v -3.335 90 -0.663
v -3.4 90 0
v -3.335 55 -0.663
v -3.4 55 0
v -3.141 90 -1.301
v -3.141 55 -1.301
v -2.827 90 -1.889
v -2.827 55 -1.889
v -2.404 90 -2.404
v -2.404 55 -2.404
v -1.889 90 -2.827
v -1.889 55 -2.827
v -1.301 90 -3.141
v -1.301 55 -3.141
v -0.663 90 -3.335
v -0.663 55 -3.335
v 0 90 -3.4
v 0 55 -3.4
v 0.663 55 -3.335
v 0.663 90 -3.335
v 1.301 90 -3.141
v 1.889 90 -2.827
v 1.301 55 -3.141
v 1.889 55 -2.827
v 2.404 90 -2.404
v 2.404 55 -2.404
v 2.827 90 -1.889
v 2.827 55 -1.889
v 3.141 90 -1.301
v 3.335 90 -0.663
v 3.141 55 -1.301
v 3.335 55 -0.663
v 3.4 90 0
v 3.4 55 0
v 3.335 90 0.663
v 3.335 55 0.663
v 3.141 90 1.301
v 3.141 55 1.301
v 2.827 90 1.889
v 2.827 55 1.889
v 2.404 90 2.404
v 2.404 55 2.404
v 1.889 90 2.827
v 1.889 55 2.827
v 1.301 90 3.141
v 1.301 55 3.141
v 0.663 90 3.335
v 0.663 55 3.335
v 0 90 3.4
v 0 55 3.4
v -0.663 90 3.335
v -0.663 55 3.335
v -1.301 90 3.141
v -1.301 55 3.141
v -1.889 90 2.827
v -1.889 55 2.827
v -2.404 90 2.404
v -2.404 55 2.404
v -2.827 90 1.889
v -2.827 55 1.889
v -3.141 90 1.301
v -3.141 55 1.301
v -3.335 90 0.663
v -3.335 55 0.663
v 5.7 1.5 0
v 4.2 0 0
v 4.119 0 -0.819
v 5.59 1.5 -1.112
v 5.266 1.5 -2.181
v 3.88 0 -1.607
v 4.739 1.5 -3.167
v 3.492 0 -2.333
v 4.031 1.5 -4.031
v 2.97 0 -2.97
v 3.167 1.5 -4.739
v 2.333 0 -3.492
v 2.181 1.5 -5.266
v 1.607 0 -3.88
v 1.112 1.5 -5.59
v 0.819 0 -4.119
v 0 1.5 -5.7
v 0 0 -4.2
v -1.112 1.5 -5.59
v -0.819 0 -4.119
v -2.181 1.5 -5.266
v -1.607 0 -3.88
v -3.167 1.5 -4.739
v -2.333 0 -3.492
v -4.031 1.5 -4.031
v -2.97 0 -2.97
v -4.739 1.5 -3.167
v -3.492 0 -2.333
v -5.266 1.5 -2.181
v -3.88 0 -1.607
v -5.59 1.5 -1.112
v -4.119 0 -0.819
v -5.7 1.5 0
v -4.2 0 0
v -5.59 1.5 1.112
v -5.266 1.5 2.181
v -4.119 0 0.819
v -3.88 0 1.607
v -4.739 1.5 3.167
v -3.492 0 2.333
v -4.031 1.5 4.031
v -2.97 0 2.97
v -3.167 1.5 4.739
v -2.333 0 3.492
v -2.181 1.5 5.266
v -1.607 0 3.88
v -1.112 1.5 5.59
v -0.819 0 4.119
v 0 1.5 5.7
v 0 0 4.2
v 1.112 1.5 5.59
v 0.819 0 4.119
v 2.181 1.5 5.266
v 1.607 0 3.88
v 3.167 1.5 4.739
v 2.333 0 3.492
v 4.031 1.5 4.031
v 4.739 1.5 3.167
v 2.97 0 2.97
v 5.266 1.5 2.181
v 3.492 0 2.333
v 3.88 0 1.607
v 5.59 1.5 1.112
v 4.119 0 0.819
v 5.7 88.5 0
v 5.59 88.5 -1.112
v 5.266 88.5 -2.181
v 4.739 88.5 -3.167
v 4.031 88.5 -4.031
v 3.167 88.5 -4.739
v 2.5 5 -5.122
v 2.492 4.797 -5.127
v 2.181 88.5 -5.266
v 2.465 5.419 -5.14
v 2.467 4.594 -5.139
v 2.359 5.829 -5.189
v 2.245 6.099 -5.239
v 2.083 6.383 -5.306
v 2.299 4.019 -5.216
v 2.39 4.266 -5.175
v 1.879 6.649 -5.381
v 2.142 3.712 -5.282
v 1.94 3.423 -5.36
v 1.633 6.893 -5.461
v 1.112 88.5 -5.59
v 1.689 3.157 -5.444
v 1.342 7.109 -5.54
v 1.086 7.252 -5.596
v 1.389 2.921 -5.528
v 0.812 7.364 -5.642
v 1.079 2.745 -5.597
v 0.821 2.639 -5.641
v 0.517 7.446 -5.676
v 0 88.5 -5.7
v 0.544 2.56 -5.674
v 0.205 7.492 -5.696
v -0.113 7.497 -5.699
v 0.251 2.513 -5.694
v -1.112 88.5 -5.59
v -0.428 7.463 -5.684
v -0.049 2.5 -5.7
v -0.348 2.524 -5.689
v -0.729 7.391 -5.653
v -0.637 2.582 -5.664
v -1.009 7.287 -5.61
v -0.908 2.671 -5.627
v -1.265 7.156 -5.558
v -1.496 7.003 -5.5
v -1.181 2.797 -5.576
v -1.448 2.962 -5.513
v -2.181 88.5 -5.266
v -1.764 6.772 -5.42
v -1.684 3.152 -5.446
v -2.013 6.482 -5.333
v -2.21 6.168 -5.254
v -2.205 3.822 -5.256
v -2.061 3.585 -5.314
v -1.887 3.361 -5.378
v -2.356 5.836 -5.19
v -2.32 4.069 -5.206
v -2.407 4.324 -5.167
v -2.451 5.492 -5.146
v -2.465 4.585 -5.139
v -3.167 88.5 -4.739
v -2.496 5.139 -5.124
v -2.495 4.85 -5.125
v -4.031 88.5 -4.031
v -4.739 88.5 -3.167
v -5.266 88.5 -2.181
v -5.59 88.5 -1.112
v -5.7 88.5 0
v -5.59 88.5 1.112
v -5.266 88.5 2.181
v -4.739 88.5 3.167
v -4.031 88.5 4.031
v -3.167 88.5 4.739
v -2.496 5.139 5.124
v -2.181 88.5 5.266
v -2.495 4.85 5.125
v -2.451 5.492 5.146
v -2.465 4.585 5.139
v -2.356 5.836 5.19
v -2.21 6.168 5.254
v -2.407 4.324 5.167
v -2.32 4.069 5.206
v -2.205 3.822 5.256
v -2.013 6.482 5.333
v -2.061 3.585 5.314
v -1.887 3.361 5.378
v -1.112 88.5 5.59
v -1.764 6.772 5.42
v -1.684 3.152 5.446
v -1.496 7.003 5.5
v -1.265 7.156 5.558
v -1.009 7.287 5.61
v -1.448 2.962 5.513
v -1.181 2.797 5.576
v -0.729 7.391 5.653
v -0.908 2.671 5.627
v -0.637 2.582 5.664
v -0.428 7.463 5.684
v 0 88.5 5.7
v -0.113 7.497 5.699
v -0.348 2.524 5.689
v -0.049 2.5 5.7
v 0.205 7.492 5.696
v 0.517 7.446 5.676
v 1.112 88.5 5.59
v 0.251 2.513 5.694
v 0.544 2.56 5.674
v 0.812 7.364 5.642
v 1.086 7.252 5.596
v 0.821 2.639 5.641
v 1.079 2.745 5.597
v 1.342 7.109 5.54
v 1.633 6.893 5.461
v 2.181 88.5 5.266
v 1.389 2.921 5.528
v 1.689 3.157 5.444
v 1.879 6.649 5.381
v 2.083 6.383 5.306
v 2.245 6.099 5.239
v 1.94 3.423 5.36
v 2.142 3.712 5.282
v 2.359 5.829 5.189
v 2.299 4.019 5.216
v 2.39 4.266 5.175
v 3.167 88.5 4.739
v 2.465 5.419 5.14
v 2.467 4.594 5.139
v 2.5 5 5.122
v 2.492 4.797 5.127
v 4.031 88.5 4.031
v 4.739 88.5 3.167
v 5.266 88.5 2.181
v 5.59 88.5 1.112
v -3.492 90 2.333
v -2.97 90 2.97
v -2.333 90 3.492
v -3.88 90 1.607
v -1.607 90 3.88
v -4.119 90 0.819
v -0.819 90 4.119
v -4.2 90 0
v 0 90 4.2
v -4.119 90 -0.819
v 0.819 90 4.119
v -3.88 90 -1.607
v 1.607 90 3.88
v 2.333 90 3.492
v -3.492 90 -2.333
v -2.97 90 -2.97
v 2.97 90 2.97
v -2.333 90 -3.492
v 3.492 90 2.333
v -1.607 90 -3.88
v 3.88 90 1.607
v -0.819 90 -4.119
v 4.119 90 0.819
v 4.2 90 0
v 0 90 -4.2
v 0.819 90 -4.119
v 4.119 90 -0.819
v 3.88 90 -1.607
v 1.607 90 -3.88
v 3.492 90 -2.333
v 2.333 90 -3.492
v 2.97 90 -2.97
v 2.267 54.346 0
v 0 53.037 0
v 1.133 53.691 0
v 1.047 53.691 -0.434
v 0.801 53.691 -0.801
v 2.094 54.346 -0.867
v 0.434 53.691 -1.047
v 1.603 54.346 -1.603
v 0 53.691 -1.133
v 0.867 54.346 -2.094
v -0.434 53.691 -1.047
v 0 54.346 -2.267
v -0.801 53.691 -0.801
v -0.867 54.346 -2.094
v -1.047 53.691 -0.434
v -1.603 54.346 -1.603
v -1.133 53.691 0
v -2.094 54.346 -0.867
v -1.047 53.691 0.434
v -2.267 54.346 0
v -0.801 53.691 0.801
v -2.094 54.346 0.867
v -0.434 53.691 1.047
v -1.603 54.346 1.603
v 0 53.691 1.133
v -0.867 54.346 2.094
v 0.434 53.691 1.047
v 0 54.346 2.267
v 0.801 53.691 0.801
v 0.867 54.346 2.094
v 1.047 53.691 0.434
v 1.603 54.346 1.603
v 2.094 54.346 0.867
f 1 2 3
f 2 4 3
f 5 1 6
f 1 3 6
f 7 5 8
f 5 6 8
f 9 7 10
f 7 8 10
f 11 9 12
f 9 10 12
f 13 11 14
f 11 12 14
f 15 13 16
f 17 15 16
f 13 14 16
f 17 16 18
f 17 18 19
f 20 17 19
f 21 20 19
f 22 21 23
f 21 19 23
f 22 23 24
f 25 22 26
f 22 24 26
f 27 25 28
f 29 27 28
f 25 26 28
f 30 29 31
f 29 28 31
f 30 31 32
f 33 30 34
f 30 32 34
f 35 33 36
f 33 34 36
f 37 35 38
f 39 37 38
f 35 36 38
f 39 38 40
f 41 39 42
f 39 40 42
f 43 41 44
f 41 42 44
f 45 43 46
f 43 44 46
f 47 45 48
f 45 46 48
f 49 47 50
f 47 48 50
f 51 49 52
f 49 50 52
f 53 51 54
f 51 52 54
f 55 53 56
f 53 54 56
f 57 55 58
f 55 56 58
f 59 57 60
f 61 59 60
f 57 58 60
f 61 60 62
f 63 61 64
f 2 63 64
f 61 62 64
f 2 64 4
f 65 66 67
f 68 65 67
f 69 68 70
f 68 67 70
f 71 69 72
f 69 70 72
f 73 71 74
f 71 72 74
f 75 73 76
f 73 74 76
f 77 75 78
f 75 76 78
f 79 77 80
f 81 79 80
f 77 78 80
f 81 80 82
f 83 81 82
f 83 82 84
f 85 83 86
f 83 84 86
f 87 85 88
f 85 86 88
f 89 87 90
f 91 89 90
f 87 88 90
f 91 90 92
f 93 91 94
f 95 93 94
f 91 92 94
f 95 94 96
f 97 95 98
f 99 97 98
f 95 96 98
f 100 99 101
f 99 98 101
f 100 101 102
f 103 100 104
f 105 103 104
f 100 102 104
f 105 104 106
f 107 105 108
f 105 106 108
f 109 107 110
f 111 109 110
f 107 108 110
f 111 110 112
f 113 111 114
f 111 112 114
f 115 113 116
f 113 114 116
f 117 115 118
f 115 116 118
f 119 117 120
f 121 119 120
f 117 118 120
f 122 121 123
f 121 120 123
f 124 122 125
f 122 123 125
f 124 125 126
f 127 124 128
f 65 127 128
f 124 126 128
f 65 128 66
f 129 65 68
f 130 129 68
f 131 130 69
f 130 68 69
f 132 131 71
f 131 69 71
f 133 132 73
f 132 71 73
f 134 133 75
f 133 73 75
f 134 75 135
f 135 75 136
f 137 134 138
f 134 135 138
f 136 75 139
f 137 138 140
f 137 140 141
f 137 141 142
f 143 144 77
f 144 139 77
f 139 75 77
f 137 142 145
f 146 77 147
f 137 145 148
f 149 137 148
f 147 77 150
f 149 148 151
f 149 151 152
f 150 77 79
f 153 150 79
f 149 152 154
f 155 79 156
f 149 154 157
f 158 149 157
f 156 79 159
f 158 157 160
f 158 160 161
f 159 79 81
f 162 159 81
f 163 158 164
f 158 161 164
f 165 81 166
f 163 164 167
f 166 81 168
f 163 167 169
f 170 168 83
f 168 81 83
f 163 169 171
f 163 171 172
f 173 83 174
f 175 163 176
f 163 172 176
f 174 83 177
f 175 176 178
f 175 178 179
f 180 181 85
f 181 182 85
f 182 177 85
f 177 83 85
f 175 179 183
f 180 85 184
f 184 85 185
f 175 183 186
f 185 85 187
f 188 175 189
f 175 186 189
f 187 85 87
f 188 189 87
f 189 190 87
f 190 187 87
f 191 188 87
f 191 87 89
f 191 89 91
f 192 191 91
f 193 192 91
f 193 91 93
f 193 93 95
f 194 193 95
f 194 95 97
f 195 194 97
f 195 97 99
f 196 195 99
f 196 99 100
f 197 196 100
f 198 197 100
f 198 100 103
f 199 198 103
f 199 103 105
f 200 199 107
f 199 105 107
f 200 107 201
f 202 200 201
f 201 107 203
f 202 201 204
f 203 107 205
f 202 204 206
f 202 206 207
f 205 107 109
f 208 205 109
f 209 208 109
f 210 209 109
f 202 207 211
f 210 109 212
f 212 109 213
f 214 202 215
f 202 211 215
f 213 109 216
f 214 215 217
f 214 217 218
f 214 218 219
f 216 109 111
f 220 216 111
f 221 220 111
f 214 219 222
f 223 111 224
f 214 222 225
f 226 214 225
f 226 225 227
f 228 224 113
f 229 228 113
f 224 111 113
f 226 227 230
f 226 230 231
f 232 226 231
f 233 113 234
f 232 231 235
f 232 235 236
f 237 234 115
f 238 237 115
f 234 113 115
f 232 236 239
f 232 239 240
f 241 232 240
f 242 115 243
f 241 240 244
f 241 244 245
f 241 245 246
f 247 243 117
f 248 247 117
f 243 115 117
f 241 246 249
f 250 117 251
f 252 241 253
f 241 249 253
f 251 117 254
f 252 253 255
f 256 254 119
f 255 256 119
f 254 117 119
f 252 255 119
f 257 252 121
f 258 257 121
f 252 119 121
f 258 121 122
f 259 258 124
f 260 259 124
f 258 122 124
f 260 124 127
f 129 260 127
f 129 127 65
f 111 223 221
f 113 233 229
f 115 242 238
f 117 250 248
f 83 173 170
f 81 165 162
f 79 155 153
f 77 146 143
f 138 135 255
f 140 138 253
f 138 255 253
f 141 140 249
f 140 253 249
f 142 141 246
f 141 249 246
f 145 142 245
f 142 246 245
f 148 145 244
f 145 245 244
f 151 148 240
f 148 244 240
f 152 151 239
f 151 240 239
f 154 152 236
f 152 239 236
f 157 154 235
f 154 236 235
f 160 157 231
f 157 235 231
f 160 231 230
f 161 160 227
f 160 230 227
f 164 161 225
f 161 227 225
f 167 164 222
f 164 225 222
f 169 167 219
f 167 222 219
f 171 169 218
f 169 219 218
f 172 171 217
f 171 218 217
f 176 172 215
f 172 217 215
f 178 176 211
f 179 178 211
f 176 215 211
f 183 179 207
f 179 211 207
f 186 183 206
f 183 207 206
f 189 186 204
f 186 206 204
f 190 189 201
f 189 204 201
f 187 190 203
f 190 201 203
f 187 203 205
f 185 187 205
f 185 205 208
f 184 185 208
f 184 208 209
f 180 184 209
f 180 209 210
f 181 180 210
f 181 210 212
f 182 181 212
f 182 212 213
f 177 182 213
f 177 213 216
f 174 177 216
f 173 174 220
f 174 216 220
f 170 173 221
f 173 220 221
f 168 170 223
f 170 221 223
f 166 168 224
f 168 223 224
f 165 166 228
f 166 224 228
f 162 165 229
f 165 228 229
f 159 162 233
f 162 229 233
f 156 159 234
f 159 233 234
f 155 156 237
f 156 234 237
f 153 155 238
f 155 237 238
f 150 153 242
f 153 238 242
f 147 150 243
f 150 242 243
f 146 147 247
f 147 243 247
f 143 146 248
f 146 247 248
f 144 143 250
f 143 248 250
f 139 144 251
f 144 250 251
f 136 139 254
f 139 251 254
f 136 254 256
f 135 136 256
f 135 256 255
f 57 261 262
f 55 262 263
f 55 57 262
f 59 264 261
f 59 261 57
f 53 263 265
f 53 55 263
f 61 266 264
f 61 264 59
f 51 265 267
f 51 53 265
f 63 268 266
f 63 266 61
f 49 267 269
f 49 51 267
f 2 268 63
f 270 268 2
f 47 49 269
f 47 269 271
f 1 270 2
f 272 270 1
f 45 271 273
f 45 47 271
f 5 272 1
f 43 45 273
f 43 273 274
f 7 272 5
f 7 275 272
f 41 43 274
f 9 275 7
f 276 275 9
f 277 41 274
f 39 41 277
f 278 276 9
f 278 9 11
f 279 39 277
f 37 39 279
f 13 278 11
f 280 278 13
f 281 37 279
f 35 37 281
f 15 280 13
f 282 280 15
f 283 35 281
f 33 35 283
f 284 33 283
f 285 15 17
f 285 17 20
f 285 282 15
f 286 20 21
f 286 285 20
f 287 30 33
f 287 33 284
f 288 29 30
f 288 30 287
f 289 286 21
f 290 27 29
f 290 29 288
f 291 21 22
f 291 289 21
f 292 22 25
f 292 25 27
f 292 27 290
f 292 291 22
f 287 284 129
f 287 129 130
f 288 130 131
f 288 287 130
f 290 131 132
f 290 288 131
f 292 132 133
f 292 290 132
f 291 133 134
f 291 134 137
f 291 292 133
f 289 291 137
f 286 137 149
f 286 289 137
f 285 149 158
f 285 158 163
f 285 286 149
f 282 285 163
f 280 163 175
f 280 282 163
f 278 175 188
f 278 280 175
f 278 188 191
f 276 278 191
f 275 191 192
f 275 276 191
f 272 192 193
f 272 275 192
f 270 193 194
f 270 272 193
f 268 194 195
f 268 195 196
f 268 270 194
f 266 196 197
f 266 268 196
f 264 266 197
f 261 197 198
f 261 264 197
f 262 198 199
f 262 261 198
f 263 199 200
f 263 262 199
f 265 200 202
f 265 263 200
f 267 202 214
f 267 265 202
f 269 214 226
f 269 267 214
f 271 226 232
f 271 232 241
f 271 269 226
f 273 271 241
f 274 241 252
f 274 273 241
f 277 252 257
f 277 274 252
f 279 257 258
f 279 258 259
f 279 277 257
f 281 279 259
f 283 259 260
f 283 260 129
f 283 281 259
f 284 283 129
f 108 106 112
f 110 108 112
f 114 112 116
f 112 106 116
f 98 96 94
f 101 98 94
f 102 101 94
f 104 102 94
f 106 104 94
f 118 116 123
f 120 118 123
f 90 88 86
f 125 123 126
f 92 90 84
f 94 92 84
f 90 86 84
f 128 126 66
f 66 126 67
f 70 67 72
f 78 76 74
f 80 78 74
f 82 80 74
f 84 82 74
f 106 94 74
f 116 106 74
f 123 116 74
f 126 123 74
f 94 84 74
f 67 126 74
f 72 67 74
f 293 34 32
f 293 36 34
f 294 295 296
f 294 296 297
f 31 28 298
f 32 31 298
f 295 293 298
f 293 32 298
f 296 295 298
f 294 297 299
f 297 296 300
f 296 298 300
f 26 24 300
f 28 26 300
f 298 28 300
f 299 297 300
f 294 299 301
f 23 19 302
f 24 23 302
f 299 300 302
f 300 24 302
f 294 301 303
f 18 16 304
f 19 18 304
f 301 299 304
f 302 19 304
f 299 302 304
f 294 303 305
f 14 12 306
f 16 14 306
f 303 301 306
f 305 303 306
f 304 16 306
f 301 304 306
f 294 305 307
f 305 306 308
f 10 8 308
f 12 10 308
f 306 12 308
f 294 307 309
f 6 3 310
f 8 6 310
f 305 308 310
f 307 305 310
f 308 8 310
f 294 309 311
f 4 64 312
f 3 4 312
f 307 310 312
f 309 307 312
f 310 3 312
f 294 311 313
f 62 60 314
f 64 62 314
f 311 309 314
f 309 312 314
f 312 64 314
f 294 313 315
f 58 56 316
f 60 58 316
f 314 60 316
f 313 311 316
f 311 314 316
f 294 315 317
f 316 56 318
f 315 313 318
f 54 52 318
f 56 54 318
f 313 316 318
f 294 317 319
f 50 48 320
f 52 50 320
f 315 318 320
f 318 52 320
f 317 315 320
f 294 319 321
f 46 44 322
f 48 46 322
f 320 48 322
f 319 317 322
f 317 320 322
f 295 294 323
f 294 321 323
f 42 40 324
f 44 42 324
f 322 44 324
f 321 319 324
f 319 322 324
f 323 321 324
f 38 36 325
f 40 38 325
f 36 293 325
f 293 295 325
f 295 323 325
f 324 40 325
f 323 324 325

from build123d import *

# Parameters (mm, degrees)
SKETCH1_R             = 5.7
BOSS_EXTRUDE1_DEPTH   = 90
M8_TAPPED_HOLE1_D     = 6.8
M8_TAPPED_HOLE1_DEPTH = 35
M8_TAPPED_HOLE1_TIP   = 1.962990915
CHAMFER2_SIZE         = 1.5
SKETCH4_R             = 2.5
CUT_EXTRUDE1_DEPTH    = 10


with BuildPart() as part:
    # Sketch1 → Boss-Extrude1 (new body)
    with BuildSketch(Plane(origin=(0, 0, 0), x_dir=(1, 0, 0), z_dir=(0, 1, 0))):
        Circle(SKETCH1_R)
    extrude(amount=BOSS_EXTRUDE1_DEPTH)

    # M8 Tapped Hole1
    with Locations(Plane(origin=(0, 90, 0), x_dir=(1, 0, 0), z_dir=(0, 1, 0))):
        with Locations((0, 0)):
            Hole(M8_TAPPED_HOLE1_D / 2, depth=M8_TAPPED_HOLE1_DEPTH)
            with Locations((0, 0, -(M8_TAPPED_HOLE1_DEPTH + M8_TAPPED_HOLE1_TIP / 2))):  # 120° drill point
                Cone(0, M8_TAPPED_HOLE1_D / 2, M8_TAPPED_HOLE1_TIP, mode=Mode.SUBTRACT)

    # Chamfer2
    chamfer2_edges = [part.edges().sort_by_distance(p)[0] for p in [
        (-5.7, 0, 0),
        (-5.7, 90, 0),
    ]]
    chamfer(chamfer2_edges, length=CHAMFER2_SIZE)

    # Sketch4 → Cut-Extrude1 (cut, symmetric)
    with BuildSketch(Plane.XY):
        with Locations((0, 5)):
            Circle(SKETCH4_R)
    extrude(amount=CUT_EXTRUDE1_DEPTH, both=True, mode=Mode.SUBTRACT)


solid = part.part
